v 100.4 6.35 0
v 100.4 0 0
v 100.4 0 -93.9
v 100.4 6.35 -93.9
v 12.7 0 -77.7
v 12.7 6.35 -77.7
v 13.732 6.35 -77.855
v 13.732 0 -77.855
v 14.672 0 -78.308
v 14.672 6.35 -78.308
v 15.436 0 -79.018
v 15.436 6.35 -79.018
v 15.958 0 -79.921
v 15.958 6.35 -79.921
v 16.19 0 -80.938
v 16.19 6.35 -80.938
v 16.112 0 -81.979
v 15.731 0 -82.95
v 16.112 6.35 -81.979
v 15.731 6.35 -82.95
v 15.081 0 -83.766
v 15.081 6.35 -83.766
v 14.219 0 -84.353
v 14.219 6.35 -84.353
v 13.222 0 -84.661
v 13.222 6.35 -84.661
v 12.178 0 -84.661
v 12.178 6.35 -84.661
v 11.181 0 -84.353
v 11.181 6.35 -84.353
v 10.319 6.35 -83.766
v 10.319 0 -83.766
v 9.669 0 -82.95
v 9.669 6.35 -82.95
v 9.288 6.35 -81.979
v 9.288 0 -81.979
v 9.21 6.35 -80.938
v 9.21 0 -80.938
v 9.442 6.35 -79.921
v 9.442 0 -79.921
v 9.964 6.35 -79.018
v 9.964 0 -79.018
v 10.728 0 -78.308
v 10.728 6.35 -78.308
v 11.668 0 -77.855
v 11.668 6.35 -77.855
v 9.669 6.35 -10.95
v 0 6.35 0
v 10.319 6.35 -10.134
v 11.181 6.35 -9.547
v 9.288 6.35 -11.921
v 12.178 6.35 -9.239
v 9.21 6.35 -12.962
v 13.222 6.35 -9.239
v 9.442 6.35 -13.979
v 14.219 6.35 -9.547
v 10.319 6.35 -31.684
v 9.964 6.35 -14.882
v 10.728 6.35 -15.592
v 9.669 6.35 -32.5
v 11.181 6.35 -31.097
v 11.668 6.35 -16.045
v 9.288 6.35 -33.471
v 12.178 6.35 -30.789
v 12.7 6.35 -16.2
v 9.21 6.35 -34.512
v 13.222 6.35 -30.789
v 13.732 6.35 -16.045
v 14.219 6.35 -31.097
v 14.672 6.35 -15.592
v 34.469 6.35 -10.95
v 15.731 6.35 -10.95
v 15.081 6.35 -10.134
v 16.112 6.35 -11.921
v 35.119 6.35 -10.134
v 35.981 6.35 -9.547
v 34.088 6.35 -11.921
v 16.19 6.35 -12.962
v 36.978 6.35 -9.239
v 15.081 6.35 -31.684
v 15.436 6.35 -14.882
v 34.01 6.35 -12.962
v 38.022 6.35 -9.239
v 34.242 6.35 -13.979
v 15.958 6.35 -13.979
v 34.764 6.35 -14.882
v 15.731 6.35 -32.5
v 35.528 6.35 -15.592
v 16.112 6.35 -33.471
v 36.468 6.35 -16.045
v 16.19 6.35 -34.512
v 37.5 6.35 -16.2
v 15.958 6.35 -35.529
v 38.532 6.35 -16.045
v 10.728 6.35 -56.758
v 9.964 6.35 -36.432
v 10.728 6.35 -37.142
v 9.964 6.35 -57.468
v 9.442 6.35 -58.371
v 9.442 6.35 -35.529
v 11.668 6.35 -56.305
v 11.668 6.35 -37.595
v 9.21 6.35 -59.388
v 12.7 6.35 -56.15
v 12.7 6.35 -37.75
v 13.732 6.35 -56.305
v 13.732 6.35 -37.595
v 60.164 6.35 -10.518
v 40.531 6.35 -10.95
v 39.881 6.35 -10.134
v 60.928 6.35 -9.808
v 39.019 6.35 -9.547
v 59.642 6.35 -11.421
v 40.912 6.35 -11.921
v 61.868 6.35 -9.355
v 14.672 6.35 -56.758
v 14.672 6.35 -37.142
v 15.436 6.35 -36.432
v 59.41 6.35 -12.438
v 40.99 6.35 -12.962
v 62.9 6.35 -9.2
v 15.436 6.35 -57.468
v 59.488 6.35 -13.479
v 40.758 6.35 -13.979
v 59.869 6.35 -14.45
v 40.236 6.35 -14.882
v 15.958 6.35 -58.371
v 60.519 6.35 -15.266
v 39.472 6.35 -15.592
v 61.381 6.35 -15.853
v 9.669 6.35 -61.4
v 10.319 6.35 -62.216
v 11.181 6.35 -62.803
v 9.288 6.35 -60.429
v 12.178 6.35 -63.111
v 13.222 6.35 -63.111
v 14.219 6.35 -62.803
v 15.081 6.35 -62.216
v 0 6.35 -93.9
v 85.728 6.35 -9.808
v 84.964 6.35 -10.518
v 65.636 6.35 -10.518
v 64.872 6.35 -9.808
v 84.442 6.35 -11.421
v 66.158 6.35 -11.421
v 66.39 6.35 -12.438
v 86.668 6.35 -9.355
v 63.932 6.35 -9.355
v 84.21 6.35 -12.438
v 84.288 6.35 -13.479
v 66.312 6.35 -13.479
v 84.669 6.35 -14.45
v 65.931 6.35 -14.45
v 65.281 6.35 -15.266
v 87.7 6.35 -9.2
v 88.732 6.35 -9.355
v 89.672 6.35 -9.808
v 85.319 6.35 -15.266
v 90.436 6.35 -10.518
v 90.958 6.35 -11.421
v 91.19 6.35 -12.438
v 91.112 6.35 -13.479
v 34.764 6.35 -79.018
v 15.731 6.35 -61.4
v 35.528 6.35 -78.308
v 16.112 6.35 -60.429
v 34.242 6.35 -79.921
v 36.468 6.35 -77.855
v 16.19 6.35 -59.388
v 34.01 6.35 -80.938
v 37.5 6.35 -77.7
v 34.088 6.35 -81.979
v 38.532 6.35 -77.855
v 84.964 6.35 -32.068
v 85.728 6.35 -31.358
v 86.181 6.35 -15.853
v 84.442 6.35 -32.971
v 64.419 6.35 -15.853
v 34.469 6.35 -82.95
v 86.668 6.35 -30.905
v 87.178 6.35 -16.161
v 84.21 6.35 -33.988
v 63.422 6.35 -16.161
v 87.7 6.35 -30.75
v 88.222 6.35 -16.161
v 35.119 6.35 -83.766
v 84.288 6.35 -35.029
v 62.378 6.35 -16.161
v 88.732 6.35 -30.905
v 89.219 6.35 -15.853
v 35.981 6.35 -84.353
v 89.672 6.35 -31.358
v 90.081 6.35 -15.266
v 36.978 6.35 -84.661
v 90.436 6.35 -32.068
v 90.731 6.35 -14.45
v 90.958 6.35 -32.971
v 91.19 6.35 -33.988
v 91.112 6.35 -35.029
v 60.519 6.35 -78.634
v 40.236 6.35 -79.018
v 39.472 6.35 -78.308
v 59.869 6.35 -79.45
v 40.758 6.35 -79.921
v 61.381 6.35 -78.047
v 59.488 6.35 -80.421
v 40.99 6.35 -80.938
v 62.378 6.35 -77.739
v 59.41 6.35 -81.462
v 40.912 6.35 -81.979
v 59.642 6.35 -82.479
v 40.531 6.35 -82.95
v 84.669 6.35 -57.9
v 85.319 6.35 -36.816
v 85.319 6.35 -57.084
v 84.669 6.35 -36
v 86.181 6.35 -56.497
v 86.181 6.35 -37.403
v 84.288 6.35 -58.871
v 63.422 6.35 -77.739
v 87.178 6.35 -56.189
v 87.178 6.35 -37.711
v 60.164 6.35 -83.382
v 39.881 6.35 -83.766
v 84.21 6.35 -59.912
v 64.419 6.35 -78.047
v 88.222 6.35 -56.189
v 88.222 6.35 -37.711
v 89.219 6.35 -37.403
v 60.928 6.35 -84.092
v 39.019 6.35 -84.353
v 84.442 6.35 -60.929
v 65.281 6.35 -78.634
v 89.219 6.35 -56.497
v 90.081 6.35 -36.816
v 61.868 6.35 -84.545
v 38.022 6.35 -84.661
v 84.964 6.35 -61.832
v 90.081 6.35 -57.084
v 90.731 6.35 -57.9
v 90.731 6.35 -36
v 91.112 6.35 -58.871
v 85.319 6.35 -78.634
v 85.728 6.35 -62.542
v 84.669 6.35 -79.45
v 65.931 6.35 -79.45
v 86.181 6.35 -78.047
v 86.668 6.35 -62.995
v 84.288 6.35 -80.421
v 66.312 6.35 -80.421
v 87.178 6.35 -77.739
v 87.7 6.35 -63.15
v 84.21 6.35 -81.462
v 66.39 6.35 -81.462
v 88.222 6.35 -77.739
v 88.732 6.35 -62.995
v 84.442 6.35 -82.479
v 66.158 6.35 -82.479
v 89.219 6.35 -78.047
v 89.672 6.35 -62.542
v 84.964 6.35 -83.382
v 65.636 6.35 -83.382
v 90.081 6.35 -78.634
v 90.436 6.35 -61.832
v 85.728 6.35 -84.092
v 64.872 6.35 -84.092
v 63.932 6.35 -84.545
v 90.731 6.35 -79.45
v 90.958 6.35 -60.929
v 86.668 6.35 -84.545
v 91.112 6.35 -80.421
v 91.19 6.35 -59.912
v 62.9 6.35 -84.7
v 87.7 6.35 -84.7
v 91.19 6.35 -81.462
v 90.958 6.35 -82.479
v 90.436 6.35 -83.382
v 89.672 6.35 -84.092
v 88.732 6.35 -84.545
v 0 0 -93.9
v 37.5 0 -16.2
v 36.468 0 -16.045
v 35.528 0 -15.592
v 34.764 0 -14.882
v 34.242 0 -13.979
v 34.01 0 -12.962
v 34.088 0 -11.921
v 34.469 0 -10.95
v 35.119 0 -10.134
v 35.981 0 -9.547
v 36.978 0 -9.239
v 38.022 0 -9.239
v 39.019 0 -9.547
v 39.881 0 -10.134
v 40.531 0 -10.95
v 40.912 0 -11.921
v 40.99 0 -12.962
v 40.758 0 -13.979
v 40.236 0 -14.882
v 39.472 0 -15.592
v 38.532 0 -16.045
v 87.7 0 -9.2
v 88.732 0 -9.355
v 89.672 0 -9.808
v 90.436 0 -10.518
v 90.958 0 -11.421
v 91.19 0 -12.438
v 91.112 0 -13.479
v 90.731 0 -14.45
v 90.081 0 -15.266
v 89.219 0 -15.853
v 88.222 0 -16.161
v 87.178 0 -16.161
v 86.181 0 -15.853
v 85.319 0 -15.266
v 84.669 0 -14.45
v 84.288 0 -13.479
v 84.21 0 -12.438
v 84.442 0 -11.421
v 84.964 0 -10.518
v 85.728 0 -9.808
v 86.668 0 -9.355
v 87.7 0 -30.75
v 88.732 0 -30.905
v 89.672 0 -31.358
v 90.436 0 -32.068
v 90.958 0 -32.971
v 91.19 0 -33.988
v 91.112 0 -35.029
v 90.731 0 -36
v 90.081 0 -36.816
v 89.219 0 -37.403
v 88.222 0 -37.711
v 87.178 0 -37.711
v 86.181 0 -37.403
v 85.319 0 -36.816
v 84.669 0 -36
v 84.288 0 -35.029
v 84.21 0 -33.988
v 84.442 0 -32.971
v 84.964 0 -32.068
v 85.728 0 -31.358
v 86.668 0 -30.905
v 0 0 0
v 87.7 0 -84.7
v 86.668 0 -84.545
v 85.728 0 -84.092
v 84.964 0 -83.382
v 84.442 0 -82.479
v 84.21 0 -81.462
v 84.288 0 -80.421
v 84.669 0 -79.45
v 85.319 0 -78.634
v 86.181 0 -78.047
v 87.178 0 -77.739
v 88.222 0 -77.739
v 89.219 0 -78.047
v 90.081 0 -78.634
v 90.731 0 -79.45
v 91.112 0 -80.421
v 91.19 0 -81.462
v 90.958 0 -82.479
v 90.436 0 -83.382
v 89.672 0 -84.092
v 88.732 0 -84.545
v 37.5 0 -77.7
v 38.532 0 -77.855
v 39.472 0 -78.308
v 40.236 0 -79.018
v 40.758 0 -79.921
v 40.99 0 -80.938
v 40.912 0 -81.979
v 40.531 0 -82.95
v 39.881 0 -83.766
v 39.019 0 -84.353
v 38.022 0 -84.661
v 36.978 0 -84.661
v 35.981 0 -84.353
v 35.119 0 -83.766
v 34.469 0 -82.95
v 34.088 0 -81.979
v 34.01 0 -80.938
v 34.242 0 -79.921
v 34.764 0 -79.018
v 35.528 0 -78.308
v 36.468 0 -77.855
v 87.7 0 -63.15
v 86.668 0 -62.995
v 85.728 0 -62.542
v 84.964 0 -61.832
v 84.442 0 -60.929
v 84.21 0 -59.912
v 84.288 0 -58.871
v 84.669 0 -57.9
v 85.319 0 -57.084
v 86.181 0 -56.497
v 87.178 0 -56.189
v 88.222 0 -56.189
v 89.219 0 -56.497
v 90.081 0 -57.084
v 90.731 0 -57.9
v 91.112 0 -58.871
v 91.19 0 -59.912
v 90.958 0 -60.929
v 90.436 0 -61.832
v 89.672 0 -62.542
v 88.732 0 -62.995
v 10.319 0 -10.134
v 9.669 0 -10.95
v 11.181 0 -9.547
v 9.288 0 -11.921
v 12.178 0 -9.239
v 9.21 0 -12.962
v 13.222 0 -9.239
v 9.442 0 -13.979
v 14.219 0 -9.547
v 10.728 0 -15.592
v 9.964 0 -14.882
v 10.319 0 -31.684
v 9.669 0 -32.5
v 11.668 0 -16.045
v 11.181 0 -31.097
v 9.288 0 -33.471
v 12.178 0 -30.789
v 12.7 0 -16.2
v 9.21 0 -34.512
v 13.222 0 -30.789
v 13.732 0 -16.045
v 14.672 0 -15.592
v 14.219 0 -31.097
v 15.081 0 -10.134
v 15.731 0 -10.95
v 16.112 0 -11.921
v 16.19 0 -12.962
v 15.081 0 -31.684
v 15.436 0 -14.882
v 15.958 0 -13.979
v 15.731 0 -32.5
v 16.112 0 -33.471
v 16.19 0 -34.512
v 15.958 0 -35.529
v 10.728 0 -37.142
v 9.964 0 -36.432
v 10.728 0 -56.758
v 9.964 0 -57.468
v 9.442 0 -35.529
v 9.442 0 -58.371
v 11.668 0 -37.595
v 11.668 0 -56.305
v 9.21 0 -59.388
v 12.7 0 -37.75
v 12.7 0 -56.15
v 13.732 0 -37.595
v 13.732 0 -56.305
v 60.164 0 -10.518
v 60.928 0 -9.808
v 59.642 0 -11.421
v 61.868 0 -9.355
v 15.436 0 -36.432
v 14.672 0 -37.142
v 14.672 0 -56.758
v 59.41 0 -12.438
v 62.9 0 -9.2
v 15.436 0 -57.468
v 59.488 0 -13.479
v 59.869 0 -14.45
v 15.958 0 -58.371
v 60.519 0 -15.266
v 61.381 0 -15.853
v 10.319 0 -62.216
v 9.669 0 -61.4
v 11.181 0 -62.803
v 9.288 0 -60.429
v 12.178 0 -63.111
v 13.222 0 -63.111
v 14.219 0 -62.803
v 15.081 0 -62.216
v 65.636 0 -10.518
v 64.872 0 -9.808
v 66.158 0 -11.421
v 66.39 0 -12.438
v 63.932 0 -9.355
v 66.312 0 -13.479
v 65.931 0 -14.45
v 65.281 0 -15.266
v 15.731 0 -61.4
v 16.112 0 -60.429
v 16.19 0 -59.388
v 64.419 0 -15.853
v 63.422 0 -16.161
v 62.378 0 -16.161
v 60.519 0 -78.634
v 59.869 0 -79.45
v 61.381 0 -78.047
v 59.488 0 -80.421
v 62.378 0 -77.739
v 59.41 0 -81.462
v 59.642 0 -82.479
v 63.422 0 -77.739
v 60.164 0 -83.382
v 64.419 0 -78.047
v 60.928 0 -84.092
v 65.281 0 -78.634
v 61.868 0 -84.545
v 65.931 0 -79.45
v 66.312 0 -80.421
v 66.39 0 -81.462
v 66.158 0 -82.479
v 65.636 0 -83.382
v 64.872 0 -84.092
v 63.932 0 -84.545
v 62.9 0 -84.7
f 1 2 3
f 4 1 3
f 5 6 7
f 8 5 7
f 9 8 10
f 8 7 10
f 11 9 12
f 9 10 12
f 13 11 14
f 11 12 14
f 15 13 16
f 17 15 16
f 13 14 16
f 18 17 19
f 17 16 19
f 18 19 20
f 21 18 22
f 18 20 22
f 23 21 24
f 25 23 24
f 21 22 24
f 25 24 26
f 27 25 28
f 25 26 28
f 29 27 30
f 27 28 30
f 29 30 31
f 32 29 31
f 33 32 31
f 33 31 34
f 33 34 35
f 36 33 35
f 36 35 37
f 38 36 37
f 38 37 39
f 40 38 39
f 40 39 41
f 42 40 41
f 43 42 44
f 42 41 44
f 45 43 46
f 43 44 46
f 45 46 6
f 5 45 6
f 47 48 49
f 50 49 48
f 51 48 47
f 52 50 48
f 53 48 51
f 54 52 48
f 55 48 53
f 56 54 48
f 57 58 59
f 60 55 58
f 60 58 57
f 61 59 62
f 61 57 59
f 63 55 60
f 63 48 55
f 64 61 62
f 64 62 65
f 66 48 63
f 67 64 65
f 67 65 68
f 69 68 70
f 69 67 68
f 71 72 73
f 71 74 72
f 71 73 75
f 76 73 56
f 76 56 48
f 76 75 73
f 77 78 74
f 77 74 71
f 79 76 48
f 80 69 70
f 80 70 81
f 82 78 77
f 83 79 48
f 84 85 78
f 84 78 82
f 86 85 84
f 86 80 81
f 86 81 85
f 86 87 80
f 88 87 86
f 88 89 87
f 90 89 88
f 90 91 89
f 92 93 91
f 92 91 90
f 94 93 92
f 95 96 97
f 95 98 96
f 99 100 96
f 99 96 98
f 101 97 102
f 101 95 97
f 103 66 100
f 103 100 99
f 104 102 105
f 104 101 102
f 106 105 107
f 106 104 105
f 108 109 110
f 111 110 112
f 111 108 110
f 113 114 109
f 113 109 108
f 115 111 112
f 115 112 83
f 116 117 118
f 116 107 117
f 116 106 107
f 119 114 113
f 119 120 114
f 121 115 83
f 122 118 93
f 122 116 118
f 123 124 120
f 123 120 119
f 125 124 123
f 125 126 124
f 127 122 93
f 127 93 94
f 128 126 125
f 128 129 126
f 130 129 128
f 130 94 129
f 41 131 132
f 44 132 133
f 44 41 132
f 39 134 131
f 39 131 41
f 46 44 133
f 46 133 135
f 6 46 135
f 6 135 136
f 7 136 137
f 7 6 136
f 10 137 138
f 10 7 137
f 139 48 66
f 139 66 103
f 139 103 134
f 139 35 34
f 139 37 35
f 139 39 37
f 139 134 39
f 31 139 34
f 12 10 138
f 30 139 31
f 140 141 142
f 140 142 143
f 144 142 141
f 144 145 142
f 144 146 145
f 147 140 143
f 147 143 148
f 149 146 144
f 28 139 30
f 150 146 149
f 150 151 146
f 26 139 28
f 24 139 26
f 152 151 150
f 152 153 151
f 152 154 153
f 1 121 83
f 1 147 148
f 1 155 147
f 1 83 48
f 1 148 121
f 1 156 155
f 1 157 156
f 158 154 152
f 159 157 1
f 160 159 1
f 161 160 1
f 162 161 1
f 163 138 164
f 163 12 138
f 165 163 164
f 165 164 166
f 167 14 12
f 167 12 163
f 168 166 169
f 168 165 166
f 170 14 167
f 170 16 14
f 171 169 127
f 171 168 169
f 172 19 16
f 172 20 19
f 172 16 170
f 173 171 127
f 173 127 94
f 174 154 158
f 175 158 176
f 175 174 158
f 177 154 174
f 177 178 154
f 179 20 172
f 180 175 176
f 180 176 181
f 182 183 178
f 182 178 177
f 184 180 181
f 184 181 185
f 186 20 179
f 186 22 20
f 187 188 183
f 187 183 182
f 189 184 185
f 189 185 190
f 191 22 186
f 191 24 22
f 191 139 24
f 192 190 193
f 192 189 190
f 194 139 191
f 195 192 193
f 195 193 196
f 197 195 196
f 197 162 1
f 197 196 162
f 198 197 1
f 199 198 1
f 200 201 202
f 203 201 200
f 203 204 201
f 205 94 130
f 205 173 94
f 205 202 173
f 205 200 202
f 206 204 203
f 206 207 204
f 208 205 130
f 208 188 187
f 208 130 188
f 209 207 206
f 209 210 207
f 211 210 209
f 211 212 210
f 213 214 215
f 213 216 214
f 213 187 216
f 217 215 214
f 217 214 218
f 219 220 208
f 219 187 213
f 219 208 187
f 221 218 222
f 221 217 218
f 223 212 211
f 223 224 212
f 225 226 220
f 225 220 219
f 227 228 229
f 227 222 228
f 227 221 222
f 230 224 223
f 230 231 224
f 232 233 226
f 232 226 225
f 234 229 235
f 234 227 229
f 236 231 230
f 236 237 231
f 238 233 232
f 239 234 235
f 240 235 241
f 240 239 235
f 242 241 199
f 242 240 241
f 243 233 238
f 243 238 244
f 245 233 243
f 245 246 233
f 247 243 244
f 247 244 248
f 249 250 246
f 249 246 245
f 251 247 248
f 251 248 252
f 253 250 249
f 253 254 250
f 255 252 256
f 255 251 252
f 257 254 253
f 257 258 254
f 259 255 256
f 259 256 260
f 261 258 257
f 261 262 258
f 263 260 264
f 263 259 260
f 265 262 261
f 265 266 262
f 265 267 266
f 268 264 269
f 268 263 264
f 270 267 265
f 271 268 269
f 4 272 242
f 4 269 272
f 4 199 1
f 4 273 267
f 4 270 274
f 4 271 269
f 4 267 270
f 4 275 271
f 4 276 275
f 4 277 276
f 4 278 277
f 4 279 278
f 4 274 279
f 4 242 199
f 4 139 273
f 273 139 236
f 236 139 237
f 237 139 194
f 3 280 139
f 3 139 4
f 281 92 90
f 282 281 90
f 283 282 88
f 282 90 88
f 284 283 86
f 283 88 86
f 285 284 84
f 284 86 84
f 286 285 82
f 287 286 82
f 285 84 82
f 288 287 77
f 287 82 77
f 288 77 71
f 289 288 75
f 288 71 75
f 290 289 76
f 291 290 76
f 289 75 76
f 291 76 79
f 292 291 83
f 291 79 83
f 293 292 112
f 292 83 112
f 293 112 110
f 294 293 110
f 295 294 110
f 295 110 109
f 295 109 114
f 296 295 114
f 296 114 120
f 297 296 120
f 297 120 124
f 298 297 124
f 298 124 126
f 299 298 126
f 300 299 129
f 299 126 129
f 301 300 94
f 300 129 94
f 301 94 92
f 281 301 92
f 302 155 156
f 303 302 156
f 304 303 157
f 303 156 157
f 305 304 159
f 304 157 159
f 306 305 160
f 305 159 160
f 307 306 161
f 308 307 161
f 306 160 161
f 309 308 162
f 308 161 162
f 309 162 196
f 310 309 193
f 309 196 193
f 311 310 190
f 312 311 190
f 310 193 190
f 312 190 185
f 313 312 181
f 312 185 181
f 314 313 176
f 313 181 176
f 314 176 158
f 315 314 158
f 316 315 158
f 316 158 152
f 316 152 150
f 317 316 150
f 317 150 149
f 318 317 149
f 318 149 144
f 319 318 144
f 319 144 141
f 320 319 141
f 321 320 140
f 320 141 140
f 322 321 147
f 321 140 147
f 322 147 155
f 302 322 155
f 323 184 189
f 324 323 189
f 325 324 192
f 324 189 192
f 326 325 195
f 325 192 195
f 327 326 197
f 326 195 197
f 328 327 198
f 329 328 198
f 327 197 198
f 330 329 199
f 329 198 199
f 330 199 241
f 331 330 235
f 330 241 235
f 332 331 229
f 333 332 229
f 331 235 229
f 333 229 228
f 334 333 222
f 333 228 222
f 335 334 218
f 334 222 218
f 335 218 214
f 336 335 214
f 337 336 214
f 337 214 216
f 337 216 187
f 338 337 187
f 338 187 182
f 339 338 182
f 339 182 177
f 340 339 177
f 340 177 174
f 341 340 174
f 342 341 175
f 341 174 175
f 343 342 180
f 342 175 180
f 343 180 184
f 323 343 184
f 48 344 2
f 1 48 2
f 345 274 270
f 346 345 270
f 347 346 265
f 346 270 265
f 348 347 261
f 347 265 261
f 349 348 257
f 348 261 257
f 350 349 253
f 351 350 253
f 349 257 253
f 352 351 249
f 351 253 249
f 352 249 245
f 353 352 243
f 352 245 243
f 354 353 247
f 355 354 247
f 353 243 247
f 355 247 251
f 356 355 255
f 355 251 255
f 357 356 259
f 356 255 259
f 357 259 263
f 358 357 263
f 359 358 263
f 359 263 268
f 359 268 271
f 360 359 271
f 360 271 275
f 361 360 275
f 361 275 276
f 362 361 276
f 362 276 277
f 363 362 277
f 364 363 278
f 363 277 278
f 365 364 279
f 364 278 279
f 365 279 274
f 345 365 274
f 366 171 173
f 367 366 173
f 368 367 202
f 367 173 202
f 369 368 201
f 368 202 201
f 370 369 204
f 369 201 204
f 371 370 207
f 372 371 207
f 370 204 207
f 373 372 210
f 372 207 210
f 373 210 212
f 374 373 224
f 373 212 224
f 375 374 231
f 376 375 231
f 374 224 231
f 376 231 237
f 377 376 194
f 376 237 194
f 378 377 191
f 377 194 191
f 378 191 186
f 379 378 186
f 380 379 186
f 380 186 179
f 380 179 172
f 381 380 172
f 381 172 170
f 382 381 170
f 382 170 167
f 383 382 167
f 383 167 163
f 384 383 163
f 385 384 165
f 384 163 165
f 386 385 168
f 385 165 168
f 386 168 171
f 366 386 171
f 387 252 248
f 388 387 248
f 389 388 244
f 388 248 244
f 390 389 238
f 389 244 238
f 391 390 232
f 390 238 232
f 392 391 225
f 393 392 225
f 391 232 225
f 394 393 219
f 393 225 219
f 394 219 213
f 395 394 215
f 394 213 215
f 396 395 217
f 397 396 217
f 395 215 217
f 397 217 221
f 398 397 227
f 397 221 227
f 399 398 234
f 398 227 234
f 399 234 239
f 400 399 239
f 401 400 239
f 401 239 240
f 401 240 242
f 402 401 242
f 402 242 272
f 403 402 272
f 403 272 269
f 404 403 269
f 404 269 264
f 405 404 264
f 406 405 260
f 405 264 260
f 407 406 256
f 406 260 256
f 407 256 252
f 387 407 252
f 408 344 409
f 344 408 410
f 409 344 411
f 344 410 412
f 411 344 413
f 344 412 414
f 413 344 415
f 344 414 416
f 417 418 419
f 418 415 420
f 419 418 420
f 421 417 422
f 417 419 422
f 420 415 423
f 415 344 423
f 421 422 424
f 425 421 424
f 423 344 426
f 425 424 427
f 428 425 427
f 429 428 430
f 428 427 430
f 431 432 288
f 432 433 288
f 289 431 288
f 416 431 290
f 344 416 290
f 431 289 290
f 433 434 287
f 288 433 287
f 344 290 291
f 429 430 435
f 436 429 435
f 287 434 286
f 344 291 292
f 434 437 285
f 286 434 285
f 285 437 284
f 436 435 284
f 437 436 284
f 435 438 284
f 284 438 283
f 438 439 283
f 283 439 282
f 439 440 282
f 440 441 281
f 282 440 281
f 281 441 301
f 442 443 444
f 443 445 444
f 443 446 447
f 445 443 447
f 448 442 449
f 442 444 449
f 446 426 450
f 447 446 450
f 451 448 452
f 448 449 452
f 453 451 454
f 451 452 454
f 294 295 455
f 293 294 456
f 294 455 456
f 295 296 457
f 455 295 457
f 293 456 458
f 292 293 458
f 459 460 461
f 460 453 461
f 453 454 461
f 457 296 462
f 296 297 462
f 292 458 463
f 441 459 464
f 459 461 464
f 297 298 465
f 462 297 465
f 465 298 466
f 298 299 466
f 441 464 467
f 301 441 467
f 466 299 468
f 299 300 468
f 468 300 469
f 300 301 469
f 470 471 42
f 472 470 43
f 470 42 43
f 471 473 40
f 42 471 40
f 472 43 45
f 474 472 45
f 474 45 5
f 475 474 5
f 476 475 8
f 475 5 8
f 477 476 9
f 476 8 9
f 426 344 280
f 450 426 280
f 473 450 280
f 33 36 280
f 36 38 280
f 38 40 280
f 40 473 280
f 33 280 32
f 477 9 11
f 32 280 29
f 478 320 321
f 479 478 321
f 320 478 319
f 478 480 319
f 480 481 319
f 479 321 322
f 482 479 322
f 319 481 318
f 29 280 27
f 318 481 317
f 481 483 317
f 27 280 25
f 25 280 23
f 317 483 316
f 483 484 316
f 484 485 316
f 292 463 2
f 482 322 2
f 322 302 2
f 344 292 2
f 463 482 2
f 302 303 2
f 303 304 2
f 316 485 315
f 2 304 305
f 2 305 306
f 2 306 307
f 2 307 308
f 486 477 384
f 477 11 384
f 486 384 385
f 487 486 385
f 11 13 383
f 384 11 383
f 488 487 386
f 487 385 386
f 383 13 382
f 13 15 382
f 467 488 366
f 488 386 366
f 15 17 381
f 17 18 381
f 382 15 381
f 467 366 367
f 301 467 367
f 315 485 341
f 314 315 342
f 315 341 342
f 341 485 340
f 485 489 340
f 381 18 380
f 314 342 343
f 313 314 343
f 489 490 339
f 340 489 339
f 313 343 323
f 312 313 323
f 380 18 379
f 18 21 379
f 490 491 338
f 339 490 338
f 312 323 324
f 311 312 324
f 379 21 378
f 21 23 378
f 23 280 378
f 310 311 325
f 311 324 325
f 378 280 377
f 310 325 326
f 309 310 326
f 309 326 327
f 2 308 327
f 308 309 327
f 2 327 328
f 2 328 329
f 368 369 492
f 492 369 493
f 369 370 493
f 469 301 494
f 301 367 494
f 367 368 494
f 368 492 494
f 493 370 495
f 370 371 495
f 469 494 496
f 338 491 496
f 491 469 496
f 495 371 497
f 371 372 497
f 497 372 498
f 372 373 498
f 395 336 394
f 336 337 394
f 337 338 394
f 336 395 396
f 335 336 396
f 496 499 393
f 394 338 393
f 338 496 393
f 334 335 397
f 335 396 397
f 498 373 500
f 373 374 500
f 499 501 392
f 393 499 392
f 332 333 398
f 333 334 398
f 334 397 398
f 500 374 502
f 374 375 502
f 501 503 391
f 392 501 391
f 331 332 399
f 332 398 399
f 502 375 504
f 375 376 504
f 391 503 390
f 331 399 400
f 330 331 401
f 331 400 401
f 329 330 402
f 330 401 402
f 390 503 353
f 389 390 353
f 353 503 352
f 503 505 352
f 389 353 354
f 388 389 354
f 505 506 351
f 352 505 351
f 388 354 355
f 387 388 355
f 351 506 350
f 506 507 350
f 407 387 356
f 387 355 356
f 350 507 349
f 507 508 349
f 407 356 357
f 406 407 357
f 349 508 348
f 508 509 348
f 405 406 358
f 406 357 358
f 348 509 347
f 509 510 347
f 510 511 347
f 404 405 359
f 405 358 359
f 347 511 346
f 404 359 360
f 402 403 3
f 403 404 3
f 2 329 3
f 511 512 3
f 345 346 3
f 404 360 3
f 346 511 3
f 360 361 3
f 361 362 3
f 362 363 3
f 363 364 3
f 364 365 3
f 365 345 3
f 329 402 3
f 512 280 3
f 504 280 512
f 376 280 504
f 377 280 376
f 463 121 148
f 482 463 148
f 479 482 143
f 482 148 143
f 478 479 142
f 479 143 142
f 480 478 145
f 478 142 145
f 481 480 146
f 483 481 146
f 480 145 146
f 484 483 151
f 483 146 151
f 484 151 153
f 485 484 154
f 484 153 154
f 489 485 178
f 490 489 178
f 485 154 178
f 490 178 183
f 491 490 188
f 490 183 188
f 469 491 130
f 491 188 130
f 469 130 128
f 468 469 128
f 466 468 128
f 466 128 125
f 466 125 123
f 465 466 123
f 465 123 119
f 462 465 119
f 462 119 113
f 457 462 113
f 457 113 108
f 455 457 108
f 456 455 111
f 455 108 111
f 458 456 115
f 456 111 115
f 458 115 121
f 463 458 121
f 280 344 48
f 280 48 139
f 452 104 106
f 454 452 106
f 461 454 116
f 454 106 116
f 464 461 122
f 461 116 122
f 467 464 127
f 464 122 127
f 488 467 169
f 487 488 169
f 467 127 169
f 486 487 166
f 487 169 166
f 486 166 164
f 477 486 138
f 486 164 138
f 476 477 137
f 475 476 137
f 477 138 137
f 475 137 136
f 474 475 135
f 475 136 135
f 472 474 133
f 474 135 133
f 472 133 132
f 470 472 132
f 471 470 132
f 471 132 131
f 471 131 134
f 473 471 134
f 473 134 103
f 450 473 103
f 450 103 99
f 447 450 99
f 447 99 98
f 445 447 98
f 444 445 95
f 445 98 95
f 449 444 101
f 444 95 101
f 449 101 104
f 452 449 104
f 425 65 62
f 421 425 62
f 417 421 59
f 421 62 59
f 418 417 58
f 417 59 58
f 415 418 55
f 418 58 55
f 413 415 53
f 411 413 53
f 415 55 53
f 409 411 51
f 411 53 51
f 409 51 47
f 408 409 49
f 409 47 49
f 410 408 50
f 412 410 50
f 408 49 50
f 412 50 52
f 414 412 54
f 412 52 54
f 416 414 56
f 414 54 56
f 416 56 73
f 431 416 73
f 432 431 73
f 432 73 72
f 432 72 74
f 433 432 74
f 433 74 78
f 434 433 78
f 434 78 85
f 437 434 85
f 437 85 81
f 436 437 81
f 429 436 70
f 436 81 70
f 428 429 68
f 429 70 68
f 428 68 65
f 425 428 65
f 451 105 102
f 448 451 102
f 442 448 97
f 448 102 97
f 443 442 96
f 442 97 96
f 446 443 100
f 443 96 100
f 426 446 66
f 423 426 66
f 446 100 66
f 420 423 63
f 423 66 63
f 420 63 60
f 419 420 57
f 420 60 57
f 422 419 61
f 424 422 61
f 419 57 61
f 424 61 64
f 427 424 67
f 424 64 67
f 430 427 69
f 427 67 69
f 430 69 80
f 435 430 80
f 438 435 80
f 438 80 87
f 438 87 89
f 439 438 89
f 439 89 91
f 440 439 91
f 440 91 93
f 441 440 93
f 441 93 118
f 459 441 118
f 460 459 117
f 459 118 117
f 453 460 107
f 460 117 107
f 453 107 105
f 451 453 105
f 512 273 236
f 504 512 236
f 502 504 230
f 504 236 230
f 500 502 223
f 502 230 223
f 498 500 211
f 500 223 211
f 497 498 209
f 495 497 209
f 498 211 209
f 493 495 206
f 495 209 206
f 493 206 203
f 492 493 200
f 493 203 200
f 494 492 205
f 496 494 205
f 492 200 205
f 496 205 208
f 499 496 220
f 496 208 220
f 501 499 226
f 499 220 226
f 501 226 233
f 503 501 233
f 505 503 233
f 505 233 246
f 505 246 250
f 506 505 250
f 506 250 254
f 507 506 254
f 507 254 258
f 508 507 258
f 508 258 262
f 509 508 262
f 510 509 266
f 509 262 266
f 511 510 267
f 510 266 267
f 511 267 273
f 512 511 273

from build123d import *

# Parameters (mm, degrees)
SKETCH1_W           = 100.4
SKETCH1_H           = 93.9
BOSS_EXTRUDE1_DEPTH = 6.35
SKETCH2_R           = 3.5
CUT_EXTRUDE1_DEPTH  = 6.35
SKETCH4_R           = 3.5
CUT_EXTRUDE2_DEPTH  = 6.35


with BuildPart() as part:
    # Sketch1 → Boss-Extrude1 (new body)
    with BuildSketch(Plane(origin=(0, 0, 0), x_dir=(1, 0, 0), z_dir=(0, 1, 0))):
        with Locations((50.2, 46.95)):
            Rectangle(SKETCH1_W, SKETCH1_H)
    extrude(amount=BOSS_EXTRUDE1_DEPTH)

    # Sketch2 → Cut-Extrude1 (cut)
    with BuildSketch(Plane(origin=(0, 6.35, 0), x_dir=(1, 0, 0), z_dir=(0, 1, 0))):
        with Locations(Location((12.7, 81.2, 0), (0, 0, 270))):
            Circle(SKETCH2_R)
        with Locations(Location((12.7, 12.7, 0), (0, 0, 90))):
            Circle(SKETCH2_R)
        with Locations(Location((87.7, 12.7, 0), (0, 0, 270))):
            Circle(SKETCH2_R)
        with Locations(Location((87.7, 81.2, 0), (0, 0, 90))):
            Circle(SKETCH2_R)
    extrude(amount=-CUT_EXTRUDE1_DEPTH, mode=Mode.SUBTRACT)

    # Sketch4 → Cut-Extrude2 (cut)
    with BuildSketch(Plane(origin=(0, 6.35, 0), x_dir=(1, 0, 0), z_dir=(0, 1, 0))):
        with Locations(Location((12.7, 59.65, 0), (0, 0, 270))):
            Circle(SKETCH4_R)
        with Locations(Location((12.7, 34.25, 0), (0, 0, 90))):
            Circle(SKETCH4_R)
        with Locations(Location((87.7, 34.25, 0), (0, 0, 270))):
            Circle(SKETCH4_R)
        with Locations(Location((87.7, 59.65, 0), (0, 0, 90))):
            Circle(SKETCH4_R)
        with Locations(Location((37.5, 81.2, 0), (0, 0, 270))):
            Circle(SKETCH4_R)
        with Locations(Location((62.9, 81.2, 0), (0, 0, 90))):
            Circle(SKETCH4_R)
        with Locations(Location((62.9, 12.7, 0), (0, 0, 270))):
            Circle(SKETCH4_R)
        with Locations(Location((37.5, 12.7, 0), (0, 0, 90))):
            Circle(SKETCH4_R)
    extrude(amount=-CUT_EXTRUDE2_DEPTH, mode=Mode.SUBTRACT)


solid = part.part
